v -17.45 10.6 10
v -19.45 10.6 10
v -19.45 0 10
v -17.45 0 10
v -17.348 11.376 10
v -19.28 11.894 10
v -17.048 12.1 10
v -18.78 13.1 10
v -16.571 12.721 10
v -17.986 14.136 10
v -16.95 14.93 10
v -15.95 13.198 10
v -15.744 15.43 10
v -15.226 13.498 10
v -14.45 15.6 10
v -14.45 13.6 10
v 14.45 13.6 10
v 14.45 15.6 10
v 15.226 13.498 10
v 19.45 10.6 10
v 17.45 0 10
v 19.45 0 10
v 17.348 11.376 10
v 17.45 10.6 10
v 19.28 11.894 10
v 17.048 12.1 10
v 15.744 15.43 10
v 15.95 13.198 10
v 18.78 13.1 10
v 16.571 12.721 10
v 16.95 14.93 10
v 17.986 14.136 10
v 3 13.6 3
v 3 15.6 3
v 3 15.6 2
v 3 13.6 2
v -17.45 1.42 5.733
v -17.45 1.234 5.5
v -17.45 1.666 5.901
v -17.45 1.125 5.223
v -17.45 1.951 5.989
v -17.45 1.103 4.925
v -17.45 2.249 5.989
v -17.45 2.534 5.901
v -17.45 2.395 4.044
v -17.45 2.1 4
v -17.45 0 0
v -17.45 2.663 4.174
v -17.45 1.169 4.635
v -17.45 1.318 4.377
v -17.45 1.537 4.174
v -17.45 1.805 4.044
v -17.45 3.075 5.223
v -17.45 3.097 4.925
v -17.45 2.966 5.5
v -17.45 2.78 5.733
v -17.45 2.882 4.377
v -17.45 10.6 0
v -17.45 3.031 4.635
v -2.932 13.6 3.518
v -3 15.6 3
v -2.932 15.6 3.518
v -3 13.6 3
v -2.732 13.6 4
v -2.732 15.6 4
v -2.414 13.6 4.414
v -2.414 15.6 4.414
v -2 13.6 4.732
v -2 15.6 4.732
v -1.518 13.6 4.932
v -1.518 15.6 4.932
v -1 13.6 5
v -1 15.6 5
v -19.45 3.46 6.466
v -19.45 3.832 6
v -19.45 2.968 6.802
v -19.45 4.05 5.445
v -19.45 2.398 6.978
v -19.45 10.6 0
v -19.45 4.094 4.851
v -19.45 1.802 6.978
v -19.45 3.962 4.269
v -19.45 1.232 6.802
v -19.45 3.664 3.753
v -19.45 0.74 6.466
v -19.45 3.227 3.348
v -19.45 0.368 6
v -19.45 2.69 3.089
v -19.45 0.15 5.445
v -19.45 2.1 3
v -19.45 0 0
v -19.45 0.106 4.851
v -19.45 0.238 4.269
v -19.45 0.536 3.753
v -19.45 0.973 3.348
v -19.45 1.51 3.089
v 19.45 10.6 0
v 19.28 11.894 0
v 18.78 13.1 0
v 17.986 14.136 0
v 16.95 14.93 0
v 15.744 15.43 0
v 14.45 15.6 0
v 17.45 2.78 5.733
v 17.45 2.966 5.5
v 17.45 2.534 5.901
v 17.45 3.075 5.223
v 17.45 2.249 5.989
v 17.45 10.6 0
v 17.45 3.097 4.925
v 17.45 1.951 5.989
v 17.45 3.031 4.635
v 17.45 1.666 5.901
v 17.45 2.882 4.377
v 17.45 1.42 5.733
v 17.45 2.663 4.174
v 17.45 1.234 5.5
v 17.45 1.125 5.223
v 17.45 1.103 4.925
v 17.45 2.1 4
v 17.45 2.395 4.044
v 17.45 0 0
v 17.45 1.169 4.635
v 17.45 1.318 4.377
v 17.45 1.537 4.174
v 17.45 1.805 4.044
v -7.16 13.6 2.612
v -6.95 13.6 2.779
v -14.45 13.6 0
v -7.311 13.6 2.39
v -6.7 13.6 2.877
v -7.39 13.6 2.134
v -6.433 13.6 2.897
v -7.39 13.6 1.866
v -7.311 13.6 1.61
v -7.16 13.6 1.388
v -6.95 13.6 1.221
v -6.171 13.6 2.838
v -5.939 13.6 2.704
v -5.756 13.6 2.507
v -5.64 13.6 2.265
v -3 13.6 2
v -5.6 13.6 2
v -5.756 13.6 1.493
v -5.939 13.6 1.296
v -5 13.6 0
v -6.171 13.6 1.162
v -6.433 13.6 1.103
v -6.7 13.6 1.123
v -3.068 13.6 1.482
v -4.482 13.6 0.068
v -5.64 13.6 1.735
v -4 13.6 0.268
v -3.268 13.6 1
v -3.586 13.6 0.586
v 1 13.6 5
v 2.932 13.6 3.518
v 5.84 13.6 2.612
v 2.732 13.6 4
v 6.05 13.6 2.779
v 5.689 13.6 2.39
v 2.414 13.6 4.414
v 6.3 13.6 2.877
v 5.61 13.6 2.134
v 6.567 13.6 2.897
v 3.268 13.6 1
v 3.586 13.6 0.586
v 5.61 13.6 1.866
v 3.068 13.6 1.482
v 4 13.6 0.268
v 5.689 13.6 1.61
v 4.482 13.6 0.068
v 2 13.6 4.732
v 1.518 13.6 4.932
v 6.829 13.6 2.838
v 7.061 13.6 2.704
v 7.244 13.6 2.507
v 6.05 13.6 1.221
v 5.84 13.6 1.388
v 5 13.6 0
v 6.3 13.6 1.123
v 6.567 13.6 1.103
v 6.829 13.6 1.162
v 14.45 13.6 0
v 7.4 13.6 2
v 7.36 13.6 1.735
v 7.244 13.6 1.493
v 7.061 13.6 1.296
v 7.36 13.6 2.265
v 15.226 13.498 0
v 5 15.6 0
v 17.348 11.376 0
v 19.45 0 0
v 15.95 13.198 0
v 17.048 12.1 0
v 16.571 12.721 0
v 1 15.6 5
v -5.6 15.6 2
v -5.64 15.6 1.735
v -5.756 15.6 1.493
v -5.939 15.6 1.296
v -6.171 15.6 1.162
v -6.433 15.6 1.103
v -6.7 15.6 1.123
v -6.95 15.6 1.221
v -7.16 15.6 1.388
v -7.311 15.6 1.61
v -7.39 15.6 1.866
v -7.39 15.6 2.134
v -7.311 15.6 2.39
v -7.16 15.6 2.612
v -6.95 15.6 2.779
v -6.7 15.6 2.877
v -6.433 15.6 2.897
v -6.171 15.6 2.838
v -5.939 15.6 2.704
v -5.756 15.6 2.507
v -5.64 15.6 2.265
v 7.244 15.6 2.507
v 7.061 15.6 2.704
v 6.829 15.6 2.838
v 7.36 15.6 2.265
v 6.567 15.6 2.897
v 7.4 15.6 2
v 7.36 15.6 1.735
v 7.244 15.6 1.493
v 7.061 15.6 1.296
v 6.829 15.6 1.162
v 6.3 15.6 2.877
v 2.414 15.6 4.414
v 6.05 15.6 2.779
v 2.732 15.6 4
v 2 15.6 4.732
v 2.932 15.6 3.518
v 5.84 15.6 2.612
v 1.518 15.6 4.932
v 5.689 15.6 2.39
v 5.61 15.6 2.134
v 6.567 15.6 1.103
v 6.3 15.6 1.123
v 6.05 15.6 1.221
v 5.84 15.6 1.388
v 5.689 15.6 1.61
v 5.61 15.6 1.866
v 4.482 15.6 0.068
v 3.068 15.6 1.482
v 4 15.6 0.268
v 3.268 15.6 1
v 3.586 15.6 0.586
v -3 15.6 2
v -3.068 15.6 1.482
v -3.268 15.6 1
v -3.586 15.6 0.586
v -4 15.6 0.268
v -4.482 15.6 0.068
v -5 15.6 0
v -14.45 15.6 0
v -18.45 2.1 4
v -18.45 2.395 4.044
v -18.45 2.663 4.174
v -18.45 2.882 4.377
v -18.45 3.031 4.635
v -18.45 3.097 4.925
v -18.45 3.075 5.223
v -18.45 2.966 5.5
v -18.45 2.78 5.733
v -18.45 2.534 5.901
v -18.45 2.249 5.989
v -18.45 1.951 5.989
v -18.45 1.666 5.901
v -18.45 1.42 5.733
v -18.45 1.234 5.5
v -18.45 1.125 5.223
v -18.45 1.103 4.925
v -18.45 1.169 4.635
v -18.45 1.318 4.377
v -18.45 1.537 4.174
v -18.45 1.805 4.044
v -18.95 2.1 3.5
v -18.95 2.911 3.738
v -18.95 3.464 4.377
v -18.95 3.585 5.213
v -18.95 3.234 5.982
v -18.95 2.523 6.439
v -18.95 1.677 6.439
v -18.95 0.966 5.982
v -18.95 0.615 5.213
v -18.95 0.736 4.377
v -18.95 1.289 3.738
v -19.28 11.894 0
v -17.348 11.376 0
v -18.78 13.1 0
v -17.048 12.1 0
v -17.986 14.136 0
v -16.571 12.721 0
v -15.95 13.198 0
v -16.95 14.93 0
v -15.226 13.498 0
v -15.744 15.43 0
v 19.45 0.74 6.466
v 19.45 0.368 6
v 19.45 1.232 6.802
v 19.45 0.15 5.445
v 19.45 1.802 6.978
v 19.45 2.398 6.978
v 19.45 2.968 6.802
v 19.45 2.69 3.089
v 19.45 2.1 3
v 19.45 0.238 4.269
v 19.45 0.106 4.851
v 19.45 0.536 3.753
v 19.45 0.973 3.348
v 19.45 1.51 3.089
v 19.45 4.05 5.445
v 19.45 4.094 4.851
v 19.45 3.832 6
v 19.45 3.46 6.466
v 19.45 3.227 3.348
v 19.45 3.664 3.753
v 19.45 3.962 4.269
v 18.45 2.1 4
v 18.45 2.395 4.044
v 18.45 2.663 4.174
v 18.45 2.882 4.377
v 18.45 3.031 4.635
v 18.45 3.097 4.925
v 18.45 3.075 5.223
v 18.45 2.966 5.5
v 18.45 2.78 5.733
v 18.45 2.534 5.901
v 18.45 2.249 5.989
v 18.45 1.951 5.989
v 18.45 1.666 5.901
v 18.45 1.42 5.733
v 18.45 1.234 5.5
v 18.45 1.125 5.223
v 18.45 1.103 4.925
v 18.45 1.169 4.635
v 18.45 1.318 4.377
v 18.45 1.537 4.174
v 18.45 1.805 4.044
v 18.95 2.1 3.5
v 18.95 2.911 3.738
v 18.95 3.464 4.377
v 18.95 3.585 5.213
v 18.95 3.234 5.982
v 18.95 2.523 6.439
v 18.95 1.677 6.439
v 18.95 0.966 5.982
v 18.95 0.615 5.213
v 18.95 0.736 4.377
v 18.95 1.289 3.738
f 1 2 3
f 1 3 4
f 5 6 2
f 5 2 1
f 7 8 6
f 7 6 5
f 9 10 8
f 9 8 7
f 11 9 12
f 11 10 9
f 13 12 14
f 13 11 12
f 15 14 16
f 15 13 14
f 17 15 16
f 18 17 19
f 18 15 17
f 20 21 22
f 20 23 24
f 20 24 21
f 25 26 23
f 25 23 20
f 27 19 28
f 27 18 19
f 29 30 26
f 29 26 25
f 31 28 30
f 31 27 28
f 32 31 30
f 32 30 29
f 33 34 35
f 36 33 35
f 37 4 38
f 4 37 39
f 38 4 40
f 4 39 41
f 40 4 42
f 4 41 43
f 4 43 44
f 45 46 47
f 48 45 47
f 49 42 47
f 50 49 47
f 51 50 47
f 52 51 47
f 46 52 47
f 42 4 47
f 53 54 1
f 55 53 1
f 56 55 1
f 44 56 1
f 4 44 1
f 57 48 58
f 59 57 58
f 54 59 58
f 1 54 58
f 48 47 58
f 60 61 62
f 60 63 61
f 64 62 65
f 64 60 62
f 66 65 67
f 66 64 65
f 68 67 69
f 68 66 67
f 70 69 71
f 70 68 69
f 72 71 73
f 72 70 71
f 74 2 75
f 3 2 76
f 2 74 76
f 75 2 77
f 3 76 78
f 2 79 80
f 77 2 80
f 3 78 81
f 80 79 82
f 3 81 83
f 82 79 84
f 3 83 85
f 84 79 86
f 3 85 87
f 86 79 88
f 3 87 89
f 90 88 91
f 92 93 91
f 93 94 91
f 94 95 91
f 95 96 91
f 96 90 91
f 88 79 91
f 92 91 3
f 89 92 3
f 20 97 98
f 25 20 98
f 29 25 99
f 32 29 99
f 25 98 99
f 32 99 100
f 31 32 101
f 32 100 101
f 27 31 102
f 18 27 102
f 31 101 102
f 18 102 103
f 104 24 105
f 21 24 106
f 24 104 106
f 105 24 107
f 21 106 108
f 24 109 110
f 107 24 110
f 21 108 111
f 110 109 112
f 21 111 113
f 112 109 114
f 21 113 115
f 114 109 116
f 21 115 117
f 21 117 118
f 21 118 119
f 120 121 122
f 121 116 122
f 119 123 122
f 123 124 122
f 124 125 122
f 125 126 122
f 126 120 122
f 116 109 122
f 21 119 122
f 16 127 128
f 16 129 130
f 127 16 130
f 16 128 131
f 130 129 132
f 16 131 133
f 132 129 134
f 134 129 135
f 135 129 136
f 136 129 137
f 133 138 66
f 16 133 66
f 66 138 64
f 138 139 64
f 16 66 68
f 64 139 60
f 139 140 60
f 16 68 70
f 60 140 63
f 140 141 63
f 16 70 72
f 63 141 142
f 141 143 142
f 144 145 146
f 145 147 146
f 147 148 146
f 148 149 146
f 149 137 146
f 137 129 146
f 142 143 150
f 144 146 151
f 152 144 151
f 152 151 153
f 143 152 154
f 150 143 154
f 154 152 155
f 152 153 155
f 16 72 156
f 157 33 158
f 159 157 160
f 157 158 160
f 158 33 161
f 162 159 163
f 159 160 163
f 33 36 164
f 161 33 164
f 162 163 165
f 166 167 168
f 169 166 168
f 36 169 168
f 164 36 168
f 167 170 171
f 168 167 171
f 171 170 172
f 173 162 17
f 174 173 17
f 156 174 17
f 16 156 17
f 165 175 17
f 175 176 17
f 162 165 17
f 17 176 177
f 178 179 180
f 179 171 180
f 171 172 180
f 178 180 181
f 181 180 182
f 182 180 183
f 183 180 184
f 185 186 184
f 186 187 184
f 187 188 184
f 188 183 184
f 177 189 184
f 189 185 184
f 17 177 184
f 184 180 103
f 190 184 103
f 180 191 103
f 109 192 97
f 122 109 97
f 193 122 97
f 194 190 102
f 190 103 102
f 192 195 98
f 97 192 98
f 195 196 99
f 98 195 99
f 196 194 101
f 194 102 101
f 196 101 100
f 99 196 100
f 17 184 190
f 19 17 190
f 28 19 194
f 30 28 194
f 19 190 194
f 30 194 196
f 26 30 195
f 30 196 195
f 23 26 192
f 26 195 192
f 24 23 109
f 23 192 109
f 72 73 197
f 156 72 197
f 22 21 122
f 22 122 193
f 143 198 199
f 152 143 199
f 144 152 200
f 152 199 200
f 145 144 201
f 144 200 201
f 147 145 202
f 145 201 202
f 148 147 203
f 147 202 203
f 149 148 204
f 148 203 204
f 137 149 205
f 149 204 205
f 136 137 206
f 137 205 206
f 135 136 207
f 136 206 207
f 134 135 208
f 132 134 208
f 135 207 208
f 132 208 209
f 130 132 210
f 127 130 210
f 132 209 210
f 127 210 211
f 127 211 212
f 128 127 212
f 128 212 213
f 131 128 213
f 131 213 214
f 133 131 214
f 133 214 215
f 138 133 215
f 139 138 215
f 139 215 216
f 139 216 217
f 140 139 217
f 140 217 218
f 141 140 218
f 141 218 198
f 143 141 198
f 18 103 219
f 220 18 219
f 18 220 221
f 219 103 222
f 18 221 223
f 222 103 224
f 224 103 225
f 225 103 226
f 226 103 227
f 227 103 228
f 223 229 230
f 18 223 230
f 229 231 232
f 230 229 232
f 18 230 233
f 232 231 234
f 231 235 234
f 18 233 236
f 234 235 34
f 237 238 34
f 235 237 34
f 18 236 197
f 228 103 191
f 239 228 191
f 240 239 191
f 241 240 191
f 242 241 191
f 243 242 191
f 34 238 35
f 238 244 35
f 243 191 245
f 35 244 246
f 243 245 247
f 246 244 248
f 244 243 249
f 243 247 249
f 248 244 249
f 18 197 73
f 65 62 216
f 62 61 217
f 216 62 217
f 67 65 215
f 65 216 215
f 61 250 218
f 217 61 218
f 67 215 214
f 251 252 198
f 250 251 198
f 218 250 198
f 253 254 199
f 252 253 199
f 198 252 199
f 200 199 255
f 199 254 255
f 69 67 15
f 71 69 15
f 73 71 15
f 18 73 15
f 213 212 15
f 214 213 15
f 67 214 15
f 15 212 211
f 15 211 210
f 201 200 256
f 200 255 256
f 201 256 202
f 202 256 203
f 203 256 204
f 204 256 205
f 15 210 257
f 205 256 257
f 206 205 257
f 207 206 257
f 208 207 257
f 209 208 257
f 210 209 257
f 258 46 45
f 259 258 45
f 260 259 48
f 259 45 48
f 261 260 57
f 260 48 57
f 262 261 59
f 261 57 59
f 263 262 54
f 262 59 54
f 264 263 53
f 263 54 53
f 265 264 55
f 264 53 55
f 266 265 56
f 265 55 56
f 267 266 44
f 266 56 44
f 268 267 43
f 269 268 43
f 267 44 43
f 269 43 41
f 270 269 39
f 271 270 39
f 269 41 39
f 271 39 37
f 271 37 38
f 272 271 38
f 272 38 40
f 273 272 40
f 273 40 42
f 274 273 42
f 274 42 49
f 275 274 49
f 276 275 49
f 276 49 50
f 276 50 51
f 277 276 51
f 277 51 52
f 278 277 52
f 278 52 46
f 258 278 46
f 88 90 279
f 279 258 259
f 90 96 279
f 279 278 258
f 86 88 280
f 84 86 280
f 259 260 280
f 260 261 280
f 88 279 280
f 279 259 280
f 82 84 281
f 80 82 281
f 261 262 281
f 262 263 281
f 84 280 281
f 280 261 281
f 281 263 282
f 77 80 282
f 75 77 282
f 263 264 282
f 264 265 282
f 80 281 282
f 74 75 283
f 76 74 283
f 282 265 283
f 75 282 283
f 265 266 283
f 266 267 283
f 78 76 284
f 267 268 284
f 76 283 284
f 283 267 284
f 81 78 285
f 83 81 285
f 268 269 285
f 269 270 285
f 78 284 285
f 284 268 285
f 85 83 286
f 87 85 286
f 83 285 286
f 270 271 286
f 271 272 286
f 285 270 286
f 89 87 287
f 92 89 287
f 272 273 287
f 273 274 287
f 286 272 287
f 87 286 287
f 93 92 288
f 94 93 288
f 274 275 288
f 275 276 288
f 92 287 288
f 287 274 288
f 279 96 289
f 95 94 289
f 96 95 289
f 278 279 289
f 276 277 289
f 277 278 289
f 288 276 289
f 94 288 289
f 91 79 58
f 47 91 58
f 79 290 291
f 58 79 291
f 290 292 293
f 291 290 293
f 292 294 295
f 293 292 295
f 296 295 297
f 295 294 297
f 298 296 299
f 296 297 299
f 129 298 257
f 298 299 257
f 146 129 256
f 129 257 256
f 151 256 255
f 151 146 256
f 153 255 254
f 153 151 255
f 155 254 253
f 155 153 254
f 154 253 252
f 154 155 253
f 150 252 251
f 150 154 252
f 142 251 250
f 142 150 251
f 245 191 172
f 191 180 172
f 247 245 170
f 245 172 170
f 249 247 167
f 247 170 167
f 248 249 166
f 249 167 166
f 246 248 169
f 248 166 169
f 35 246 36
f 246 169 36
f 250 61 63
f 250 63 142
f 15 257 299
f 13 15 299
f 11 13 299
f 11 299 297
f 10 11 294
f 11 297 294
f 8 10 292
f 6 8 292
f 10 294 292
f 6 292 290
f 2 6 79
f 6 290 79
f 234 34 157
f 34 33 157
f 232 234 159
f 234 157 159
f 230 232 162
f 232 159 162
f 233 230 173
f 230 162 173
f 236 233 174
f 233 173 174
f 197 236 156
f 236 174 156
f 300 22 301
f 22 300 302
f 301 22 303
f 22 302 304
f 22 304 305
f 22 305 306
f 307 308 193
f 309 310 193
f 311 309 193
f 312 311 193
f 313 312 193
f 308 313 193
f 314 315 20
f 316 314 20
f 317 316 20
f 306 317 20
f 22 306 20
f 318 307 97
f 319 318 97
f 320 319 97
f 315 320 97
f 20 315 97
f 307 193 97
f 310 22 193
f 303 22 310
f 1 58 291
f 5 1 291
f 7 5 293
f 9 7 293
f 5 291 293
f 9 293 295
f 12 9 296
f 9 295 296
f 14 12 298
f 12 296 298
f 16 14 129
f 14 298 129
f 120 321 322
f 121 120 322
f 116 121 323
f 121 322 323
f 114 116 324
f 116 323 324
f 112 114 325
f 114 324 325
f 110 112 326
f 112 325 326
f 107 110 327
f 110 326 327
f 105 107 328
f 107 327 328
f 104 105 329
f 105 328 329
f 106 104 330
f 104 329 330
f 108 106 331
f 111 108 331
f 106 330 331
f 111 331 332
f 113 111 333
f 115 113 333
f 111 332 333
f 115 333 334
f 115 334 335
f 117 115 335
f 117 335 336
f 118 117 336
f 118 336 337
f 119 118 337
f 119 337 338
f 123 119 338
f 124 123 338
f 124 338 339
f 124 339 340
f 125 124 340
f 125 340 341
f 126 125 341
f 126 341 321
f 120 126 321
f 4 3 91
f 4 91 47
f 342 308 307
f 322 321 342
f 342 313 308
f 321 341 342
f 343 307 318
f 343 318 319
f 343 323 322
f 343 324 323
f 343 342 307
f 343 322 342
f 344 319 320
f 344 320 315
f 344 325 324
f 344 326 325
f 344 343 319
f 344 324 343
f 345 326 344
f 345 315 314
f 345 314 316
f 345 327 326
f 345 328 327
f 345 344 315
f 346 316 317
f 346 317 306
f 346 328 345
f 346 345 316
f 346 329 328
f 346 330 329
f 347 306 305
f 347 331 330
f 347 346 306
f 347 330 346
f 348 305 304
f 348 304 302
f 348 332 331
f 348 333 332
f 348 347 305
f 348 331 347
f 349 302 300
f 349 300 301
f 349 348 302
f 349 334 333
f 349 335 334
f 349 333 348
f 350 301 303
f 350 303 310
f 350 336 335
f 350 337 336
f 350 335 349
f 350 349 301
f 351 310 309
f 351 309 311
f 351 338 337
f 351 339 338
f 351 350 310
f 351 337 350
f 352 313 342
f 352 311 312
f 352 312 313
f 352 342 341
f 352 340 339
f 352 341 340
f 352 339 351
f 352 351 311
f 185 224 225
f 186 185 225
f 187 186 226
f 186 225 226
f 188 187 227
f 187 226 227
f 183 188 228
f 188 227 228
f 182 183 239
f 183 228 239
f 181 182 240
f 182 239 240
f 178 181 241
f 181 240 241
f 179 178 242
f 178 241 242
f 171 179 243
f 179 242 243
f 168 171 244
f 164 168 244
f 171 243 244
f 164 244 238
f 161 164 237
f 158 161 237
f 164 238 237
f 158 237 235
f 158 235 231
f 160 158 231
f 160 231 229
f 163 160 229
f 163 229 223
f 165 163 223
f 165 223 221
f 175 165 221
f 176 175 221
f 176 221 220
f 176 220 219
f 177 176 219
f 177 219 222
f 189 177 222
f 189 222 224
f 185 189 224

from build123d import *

# Parameters (mm, degrees)
BOSS_EXTRUDE1_DEPTH     = 10
SKETCH2_R               = 1
CUT_EXTRUDE1_DEPTH      = 1
CUT_EXTRUDE1_DEPTH_BACK = 39.9
CHAMFER1_SIZE           = 1
SKETCH3_R               = 0.9
SKETCH3_W               = 6
SKETCH3_H               = 5
CUT_EXTRUDE2_DEPTH      = 16.6
FILLET1_R               = 2


with BuildPart() as part:
    # Sketch1 → Boss-Extrude1 (new body)
    with BuildSketch(Plane.XY):
        with BuildLine():
            Line((17.45, 0), (19.45, 0))
            Line((19.45, 0), (19.45, 10.6))
            ThreePointArc((19.45, 10.6), (17.985533906, 14.135533906), (14.45, 15.6))
            Line((14.45, 15.6), (-14.45, 15.6))
            ThreePointArc((-14.45, 15.6), (-17.985533906, 14.135533906), (-19.45, 10.6))
            Line((-19.45, 10.6), (-19.45, 0))
            Line((-19.45, 0), (-17.45, 0))
            Line((-17.45, 0), (-17.45, 10.6))
            ThreePointArc((-17.45, 10.6), (-16.571320344, 12.721320344), (-14.45, 13.6))
            Line((-14.45, 13.6), (14.45, 13.6))
            ThreePointArc((14.45, 13.6), (16.571320344, 12.721320344), (17.45, 10.6))
            Line((17.45, 10.6), (17.45, 0))
        make_face()
    extrude(amount=BOSS_EXTRUDE1_DEPTH)

    # Sketch2 → Cut-Extrude1 (cut, two sides)
    with BuildSketch(Plane(origin=(19.45, 0, 0), x_dir=(0, 0, -1), z_dir=(1, 0, 0))) as cut_extrude1_sk:
        with Locations((-5, 2.1)):
            Circle(SKETCH2_R)
    extrude(amount=CUT_EXTRUDE1_DEPTH, mode=Mode.SUBTRACT)
    extrude(cut_extrude1_sk.sketch, amount=-CUT_EXTRUDE1_DEPTH_BACK, mode=Mode.SUBTRACT)

    # Chamfer1
    chamfer1_edges = [part.edges().sort_by_distance(p)[0] for p in [
        (-19.45, 2.1, 6),
        (19.45, 2.1, 6),
    ]]
    chamfer(chamfer1_edges, length=CHAMFER1_SIZE)

    # Sketch3 → Cut-Extrude2 (cut, through all)
    with BuildSketch(Plane(origin=(0, 15.6, 0), x_dir=(1, 0, 0), z_dir=(0, 1, 0))):
        with Locations((-6.5, -2)):
            Circle(SKETCH3_R)
        with Locations((6.5, -2)):
            Circle(SKETCH3_R)
        with Locations((0, -2.5)):
            Rectangle(SKETCH3_W, SKETCH3_H)
    extrude(amount=-CUT_EXTRUDE2_DEPTH, mode=Mode.SUBTRACT)

    # Fillet1
    fillet1_edges = [part.edges().sort_by_distance(p)[0] for p in [
        (-3, 14.6, 0),
        (3, 14.6, 0),
        (3, 14.6, 5),
        (-3, 14.6, 5),
    ]]
    fillet(fillet1_edges, radius=FILLET1_R)


solid = part.part
